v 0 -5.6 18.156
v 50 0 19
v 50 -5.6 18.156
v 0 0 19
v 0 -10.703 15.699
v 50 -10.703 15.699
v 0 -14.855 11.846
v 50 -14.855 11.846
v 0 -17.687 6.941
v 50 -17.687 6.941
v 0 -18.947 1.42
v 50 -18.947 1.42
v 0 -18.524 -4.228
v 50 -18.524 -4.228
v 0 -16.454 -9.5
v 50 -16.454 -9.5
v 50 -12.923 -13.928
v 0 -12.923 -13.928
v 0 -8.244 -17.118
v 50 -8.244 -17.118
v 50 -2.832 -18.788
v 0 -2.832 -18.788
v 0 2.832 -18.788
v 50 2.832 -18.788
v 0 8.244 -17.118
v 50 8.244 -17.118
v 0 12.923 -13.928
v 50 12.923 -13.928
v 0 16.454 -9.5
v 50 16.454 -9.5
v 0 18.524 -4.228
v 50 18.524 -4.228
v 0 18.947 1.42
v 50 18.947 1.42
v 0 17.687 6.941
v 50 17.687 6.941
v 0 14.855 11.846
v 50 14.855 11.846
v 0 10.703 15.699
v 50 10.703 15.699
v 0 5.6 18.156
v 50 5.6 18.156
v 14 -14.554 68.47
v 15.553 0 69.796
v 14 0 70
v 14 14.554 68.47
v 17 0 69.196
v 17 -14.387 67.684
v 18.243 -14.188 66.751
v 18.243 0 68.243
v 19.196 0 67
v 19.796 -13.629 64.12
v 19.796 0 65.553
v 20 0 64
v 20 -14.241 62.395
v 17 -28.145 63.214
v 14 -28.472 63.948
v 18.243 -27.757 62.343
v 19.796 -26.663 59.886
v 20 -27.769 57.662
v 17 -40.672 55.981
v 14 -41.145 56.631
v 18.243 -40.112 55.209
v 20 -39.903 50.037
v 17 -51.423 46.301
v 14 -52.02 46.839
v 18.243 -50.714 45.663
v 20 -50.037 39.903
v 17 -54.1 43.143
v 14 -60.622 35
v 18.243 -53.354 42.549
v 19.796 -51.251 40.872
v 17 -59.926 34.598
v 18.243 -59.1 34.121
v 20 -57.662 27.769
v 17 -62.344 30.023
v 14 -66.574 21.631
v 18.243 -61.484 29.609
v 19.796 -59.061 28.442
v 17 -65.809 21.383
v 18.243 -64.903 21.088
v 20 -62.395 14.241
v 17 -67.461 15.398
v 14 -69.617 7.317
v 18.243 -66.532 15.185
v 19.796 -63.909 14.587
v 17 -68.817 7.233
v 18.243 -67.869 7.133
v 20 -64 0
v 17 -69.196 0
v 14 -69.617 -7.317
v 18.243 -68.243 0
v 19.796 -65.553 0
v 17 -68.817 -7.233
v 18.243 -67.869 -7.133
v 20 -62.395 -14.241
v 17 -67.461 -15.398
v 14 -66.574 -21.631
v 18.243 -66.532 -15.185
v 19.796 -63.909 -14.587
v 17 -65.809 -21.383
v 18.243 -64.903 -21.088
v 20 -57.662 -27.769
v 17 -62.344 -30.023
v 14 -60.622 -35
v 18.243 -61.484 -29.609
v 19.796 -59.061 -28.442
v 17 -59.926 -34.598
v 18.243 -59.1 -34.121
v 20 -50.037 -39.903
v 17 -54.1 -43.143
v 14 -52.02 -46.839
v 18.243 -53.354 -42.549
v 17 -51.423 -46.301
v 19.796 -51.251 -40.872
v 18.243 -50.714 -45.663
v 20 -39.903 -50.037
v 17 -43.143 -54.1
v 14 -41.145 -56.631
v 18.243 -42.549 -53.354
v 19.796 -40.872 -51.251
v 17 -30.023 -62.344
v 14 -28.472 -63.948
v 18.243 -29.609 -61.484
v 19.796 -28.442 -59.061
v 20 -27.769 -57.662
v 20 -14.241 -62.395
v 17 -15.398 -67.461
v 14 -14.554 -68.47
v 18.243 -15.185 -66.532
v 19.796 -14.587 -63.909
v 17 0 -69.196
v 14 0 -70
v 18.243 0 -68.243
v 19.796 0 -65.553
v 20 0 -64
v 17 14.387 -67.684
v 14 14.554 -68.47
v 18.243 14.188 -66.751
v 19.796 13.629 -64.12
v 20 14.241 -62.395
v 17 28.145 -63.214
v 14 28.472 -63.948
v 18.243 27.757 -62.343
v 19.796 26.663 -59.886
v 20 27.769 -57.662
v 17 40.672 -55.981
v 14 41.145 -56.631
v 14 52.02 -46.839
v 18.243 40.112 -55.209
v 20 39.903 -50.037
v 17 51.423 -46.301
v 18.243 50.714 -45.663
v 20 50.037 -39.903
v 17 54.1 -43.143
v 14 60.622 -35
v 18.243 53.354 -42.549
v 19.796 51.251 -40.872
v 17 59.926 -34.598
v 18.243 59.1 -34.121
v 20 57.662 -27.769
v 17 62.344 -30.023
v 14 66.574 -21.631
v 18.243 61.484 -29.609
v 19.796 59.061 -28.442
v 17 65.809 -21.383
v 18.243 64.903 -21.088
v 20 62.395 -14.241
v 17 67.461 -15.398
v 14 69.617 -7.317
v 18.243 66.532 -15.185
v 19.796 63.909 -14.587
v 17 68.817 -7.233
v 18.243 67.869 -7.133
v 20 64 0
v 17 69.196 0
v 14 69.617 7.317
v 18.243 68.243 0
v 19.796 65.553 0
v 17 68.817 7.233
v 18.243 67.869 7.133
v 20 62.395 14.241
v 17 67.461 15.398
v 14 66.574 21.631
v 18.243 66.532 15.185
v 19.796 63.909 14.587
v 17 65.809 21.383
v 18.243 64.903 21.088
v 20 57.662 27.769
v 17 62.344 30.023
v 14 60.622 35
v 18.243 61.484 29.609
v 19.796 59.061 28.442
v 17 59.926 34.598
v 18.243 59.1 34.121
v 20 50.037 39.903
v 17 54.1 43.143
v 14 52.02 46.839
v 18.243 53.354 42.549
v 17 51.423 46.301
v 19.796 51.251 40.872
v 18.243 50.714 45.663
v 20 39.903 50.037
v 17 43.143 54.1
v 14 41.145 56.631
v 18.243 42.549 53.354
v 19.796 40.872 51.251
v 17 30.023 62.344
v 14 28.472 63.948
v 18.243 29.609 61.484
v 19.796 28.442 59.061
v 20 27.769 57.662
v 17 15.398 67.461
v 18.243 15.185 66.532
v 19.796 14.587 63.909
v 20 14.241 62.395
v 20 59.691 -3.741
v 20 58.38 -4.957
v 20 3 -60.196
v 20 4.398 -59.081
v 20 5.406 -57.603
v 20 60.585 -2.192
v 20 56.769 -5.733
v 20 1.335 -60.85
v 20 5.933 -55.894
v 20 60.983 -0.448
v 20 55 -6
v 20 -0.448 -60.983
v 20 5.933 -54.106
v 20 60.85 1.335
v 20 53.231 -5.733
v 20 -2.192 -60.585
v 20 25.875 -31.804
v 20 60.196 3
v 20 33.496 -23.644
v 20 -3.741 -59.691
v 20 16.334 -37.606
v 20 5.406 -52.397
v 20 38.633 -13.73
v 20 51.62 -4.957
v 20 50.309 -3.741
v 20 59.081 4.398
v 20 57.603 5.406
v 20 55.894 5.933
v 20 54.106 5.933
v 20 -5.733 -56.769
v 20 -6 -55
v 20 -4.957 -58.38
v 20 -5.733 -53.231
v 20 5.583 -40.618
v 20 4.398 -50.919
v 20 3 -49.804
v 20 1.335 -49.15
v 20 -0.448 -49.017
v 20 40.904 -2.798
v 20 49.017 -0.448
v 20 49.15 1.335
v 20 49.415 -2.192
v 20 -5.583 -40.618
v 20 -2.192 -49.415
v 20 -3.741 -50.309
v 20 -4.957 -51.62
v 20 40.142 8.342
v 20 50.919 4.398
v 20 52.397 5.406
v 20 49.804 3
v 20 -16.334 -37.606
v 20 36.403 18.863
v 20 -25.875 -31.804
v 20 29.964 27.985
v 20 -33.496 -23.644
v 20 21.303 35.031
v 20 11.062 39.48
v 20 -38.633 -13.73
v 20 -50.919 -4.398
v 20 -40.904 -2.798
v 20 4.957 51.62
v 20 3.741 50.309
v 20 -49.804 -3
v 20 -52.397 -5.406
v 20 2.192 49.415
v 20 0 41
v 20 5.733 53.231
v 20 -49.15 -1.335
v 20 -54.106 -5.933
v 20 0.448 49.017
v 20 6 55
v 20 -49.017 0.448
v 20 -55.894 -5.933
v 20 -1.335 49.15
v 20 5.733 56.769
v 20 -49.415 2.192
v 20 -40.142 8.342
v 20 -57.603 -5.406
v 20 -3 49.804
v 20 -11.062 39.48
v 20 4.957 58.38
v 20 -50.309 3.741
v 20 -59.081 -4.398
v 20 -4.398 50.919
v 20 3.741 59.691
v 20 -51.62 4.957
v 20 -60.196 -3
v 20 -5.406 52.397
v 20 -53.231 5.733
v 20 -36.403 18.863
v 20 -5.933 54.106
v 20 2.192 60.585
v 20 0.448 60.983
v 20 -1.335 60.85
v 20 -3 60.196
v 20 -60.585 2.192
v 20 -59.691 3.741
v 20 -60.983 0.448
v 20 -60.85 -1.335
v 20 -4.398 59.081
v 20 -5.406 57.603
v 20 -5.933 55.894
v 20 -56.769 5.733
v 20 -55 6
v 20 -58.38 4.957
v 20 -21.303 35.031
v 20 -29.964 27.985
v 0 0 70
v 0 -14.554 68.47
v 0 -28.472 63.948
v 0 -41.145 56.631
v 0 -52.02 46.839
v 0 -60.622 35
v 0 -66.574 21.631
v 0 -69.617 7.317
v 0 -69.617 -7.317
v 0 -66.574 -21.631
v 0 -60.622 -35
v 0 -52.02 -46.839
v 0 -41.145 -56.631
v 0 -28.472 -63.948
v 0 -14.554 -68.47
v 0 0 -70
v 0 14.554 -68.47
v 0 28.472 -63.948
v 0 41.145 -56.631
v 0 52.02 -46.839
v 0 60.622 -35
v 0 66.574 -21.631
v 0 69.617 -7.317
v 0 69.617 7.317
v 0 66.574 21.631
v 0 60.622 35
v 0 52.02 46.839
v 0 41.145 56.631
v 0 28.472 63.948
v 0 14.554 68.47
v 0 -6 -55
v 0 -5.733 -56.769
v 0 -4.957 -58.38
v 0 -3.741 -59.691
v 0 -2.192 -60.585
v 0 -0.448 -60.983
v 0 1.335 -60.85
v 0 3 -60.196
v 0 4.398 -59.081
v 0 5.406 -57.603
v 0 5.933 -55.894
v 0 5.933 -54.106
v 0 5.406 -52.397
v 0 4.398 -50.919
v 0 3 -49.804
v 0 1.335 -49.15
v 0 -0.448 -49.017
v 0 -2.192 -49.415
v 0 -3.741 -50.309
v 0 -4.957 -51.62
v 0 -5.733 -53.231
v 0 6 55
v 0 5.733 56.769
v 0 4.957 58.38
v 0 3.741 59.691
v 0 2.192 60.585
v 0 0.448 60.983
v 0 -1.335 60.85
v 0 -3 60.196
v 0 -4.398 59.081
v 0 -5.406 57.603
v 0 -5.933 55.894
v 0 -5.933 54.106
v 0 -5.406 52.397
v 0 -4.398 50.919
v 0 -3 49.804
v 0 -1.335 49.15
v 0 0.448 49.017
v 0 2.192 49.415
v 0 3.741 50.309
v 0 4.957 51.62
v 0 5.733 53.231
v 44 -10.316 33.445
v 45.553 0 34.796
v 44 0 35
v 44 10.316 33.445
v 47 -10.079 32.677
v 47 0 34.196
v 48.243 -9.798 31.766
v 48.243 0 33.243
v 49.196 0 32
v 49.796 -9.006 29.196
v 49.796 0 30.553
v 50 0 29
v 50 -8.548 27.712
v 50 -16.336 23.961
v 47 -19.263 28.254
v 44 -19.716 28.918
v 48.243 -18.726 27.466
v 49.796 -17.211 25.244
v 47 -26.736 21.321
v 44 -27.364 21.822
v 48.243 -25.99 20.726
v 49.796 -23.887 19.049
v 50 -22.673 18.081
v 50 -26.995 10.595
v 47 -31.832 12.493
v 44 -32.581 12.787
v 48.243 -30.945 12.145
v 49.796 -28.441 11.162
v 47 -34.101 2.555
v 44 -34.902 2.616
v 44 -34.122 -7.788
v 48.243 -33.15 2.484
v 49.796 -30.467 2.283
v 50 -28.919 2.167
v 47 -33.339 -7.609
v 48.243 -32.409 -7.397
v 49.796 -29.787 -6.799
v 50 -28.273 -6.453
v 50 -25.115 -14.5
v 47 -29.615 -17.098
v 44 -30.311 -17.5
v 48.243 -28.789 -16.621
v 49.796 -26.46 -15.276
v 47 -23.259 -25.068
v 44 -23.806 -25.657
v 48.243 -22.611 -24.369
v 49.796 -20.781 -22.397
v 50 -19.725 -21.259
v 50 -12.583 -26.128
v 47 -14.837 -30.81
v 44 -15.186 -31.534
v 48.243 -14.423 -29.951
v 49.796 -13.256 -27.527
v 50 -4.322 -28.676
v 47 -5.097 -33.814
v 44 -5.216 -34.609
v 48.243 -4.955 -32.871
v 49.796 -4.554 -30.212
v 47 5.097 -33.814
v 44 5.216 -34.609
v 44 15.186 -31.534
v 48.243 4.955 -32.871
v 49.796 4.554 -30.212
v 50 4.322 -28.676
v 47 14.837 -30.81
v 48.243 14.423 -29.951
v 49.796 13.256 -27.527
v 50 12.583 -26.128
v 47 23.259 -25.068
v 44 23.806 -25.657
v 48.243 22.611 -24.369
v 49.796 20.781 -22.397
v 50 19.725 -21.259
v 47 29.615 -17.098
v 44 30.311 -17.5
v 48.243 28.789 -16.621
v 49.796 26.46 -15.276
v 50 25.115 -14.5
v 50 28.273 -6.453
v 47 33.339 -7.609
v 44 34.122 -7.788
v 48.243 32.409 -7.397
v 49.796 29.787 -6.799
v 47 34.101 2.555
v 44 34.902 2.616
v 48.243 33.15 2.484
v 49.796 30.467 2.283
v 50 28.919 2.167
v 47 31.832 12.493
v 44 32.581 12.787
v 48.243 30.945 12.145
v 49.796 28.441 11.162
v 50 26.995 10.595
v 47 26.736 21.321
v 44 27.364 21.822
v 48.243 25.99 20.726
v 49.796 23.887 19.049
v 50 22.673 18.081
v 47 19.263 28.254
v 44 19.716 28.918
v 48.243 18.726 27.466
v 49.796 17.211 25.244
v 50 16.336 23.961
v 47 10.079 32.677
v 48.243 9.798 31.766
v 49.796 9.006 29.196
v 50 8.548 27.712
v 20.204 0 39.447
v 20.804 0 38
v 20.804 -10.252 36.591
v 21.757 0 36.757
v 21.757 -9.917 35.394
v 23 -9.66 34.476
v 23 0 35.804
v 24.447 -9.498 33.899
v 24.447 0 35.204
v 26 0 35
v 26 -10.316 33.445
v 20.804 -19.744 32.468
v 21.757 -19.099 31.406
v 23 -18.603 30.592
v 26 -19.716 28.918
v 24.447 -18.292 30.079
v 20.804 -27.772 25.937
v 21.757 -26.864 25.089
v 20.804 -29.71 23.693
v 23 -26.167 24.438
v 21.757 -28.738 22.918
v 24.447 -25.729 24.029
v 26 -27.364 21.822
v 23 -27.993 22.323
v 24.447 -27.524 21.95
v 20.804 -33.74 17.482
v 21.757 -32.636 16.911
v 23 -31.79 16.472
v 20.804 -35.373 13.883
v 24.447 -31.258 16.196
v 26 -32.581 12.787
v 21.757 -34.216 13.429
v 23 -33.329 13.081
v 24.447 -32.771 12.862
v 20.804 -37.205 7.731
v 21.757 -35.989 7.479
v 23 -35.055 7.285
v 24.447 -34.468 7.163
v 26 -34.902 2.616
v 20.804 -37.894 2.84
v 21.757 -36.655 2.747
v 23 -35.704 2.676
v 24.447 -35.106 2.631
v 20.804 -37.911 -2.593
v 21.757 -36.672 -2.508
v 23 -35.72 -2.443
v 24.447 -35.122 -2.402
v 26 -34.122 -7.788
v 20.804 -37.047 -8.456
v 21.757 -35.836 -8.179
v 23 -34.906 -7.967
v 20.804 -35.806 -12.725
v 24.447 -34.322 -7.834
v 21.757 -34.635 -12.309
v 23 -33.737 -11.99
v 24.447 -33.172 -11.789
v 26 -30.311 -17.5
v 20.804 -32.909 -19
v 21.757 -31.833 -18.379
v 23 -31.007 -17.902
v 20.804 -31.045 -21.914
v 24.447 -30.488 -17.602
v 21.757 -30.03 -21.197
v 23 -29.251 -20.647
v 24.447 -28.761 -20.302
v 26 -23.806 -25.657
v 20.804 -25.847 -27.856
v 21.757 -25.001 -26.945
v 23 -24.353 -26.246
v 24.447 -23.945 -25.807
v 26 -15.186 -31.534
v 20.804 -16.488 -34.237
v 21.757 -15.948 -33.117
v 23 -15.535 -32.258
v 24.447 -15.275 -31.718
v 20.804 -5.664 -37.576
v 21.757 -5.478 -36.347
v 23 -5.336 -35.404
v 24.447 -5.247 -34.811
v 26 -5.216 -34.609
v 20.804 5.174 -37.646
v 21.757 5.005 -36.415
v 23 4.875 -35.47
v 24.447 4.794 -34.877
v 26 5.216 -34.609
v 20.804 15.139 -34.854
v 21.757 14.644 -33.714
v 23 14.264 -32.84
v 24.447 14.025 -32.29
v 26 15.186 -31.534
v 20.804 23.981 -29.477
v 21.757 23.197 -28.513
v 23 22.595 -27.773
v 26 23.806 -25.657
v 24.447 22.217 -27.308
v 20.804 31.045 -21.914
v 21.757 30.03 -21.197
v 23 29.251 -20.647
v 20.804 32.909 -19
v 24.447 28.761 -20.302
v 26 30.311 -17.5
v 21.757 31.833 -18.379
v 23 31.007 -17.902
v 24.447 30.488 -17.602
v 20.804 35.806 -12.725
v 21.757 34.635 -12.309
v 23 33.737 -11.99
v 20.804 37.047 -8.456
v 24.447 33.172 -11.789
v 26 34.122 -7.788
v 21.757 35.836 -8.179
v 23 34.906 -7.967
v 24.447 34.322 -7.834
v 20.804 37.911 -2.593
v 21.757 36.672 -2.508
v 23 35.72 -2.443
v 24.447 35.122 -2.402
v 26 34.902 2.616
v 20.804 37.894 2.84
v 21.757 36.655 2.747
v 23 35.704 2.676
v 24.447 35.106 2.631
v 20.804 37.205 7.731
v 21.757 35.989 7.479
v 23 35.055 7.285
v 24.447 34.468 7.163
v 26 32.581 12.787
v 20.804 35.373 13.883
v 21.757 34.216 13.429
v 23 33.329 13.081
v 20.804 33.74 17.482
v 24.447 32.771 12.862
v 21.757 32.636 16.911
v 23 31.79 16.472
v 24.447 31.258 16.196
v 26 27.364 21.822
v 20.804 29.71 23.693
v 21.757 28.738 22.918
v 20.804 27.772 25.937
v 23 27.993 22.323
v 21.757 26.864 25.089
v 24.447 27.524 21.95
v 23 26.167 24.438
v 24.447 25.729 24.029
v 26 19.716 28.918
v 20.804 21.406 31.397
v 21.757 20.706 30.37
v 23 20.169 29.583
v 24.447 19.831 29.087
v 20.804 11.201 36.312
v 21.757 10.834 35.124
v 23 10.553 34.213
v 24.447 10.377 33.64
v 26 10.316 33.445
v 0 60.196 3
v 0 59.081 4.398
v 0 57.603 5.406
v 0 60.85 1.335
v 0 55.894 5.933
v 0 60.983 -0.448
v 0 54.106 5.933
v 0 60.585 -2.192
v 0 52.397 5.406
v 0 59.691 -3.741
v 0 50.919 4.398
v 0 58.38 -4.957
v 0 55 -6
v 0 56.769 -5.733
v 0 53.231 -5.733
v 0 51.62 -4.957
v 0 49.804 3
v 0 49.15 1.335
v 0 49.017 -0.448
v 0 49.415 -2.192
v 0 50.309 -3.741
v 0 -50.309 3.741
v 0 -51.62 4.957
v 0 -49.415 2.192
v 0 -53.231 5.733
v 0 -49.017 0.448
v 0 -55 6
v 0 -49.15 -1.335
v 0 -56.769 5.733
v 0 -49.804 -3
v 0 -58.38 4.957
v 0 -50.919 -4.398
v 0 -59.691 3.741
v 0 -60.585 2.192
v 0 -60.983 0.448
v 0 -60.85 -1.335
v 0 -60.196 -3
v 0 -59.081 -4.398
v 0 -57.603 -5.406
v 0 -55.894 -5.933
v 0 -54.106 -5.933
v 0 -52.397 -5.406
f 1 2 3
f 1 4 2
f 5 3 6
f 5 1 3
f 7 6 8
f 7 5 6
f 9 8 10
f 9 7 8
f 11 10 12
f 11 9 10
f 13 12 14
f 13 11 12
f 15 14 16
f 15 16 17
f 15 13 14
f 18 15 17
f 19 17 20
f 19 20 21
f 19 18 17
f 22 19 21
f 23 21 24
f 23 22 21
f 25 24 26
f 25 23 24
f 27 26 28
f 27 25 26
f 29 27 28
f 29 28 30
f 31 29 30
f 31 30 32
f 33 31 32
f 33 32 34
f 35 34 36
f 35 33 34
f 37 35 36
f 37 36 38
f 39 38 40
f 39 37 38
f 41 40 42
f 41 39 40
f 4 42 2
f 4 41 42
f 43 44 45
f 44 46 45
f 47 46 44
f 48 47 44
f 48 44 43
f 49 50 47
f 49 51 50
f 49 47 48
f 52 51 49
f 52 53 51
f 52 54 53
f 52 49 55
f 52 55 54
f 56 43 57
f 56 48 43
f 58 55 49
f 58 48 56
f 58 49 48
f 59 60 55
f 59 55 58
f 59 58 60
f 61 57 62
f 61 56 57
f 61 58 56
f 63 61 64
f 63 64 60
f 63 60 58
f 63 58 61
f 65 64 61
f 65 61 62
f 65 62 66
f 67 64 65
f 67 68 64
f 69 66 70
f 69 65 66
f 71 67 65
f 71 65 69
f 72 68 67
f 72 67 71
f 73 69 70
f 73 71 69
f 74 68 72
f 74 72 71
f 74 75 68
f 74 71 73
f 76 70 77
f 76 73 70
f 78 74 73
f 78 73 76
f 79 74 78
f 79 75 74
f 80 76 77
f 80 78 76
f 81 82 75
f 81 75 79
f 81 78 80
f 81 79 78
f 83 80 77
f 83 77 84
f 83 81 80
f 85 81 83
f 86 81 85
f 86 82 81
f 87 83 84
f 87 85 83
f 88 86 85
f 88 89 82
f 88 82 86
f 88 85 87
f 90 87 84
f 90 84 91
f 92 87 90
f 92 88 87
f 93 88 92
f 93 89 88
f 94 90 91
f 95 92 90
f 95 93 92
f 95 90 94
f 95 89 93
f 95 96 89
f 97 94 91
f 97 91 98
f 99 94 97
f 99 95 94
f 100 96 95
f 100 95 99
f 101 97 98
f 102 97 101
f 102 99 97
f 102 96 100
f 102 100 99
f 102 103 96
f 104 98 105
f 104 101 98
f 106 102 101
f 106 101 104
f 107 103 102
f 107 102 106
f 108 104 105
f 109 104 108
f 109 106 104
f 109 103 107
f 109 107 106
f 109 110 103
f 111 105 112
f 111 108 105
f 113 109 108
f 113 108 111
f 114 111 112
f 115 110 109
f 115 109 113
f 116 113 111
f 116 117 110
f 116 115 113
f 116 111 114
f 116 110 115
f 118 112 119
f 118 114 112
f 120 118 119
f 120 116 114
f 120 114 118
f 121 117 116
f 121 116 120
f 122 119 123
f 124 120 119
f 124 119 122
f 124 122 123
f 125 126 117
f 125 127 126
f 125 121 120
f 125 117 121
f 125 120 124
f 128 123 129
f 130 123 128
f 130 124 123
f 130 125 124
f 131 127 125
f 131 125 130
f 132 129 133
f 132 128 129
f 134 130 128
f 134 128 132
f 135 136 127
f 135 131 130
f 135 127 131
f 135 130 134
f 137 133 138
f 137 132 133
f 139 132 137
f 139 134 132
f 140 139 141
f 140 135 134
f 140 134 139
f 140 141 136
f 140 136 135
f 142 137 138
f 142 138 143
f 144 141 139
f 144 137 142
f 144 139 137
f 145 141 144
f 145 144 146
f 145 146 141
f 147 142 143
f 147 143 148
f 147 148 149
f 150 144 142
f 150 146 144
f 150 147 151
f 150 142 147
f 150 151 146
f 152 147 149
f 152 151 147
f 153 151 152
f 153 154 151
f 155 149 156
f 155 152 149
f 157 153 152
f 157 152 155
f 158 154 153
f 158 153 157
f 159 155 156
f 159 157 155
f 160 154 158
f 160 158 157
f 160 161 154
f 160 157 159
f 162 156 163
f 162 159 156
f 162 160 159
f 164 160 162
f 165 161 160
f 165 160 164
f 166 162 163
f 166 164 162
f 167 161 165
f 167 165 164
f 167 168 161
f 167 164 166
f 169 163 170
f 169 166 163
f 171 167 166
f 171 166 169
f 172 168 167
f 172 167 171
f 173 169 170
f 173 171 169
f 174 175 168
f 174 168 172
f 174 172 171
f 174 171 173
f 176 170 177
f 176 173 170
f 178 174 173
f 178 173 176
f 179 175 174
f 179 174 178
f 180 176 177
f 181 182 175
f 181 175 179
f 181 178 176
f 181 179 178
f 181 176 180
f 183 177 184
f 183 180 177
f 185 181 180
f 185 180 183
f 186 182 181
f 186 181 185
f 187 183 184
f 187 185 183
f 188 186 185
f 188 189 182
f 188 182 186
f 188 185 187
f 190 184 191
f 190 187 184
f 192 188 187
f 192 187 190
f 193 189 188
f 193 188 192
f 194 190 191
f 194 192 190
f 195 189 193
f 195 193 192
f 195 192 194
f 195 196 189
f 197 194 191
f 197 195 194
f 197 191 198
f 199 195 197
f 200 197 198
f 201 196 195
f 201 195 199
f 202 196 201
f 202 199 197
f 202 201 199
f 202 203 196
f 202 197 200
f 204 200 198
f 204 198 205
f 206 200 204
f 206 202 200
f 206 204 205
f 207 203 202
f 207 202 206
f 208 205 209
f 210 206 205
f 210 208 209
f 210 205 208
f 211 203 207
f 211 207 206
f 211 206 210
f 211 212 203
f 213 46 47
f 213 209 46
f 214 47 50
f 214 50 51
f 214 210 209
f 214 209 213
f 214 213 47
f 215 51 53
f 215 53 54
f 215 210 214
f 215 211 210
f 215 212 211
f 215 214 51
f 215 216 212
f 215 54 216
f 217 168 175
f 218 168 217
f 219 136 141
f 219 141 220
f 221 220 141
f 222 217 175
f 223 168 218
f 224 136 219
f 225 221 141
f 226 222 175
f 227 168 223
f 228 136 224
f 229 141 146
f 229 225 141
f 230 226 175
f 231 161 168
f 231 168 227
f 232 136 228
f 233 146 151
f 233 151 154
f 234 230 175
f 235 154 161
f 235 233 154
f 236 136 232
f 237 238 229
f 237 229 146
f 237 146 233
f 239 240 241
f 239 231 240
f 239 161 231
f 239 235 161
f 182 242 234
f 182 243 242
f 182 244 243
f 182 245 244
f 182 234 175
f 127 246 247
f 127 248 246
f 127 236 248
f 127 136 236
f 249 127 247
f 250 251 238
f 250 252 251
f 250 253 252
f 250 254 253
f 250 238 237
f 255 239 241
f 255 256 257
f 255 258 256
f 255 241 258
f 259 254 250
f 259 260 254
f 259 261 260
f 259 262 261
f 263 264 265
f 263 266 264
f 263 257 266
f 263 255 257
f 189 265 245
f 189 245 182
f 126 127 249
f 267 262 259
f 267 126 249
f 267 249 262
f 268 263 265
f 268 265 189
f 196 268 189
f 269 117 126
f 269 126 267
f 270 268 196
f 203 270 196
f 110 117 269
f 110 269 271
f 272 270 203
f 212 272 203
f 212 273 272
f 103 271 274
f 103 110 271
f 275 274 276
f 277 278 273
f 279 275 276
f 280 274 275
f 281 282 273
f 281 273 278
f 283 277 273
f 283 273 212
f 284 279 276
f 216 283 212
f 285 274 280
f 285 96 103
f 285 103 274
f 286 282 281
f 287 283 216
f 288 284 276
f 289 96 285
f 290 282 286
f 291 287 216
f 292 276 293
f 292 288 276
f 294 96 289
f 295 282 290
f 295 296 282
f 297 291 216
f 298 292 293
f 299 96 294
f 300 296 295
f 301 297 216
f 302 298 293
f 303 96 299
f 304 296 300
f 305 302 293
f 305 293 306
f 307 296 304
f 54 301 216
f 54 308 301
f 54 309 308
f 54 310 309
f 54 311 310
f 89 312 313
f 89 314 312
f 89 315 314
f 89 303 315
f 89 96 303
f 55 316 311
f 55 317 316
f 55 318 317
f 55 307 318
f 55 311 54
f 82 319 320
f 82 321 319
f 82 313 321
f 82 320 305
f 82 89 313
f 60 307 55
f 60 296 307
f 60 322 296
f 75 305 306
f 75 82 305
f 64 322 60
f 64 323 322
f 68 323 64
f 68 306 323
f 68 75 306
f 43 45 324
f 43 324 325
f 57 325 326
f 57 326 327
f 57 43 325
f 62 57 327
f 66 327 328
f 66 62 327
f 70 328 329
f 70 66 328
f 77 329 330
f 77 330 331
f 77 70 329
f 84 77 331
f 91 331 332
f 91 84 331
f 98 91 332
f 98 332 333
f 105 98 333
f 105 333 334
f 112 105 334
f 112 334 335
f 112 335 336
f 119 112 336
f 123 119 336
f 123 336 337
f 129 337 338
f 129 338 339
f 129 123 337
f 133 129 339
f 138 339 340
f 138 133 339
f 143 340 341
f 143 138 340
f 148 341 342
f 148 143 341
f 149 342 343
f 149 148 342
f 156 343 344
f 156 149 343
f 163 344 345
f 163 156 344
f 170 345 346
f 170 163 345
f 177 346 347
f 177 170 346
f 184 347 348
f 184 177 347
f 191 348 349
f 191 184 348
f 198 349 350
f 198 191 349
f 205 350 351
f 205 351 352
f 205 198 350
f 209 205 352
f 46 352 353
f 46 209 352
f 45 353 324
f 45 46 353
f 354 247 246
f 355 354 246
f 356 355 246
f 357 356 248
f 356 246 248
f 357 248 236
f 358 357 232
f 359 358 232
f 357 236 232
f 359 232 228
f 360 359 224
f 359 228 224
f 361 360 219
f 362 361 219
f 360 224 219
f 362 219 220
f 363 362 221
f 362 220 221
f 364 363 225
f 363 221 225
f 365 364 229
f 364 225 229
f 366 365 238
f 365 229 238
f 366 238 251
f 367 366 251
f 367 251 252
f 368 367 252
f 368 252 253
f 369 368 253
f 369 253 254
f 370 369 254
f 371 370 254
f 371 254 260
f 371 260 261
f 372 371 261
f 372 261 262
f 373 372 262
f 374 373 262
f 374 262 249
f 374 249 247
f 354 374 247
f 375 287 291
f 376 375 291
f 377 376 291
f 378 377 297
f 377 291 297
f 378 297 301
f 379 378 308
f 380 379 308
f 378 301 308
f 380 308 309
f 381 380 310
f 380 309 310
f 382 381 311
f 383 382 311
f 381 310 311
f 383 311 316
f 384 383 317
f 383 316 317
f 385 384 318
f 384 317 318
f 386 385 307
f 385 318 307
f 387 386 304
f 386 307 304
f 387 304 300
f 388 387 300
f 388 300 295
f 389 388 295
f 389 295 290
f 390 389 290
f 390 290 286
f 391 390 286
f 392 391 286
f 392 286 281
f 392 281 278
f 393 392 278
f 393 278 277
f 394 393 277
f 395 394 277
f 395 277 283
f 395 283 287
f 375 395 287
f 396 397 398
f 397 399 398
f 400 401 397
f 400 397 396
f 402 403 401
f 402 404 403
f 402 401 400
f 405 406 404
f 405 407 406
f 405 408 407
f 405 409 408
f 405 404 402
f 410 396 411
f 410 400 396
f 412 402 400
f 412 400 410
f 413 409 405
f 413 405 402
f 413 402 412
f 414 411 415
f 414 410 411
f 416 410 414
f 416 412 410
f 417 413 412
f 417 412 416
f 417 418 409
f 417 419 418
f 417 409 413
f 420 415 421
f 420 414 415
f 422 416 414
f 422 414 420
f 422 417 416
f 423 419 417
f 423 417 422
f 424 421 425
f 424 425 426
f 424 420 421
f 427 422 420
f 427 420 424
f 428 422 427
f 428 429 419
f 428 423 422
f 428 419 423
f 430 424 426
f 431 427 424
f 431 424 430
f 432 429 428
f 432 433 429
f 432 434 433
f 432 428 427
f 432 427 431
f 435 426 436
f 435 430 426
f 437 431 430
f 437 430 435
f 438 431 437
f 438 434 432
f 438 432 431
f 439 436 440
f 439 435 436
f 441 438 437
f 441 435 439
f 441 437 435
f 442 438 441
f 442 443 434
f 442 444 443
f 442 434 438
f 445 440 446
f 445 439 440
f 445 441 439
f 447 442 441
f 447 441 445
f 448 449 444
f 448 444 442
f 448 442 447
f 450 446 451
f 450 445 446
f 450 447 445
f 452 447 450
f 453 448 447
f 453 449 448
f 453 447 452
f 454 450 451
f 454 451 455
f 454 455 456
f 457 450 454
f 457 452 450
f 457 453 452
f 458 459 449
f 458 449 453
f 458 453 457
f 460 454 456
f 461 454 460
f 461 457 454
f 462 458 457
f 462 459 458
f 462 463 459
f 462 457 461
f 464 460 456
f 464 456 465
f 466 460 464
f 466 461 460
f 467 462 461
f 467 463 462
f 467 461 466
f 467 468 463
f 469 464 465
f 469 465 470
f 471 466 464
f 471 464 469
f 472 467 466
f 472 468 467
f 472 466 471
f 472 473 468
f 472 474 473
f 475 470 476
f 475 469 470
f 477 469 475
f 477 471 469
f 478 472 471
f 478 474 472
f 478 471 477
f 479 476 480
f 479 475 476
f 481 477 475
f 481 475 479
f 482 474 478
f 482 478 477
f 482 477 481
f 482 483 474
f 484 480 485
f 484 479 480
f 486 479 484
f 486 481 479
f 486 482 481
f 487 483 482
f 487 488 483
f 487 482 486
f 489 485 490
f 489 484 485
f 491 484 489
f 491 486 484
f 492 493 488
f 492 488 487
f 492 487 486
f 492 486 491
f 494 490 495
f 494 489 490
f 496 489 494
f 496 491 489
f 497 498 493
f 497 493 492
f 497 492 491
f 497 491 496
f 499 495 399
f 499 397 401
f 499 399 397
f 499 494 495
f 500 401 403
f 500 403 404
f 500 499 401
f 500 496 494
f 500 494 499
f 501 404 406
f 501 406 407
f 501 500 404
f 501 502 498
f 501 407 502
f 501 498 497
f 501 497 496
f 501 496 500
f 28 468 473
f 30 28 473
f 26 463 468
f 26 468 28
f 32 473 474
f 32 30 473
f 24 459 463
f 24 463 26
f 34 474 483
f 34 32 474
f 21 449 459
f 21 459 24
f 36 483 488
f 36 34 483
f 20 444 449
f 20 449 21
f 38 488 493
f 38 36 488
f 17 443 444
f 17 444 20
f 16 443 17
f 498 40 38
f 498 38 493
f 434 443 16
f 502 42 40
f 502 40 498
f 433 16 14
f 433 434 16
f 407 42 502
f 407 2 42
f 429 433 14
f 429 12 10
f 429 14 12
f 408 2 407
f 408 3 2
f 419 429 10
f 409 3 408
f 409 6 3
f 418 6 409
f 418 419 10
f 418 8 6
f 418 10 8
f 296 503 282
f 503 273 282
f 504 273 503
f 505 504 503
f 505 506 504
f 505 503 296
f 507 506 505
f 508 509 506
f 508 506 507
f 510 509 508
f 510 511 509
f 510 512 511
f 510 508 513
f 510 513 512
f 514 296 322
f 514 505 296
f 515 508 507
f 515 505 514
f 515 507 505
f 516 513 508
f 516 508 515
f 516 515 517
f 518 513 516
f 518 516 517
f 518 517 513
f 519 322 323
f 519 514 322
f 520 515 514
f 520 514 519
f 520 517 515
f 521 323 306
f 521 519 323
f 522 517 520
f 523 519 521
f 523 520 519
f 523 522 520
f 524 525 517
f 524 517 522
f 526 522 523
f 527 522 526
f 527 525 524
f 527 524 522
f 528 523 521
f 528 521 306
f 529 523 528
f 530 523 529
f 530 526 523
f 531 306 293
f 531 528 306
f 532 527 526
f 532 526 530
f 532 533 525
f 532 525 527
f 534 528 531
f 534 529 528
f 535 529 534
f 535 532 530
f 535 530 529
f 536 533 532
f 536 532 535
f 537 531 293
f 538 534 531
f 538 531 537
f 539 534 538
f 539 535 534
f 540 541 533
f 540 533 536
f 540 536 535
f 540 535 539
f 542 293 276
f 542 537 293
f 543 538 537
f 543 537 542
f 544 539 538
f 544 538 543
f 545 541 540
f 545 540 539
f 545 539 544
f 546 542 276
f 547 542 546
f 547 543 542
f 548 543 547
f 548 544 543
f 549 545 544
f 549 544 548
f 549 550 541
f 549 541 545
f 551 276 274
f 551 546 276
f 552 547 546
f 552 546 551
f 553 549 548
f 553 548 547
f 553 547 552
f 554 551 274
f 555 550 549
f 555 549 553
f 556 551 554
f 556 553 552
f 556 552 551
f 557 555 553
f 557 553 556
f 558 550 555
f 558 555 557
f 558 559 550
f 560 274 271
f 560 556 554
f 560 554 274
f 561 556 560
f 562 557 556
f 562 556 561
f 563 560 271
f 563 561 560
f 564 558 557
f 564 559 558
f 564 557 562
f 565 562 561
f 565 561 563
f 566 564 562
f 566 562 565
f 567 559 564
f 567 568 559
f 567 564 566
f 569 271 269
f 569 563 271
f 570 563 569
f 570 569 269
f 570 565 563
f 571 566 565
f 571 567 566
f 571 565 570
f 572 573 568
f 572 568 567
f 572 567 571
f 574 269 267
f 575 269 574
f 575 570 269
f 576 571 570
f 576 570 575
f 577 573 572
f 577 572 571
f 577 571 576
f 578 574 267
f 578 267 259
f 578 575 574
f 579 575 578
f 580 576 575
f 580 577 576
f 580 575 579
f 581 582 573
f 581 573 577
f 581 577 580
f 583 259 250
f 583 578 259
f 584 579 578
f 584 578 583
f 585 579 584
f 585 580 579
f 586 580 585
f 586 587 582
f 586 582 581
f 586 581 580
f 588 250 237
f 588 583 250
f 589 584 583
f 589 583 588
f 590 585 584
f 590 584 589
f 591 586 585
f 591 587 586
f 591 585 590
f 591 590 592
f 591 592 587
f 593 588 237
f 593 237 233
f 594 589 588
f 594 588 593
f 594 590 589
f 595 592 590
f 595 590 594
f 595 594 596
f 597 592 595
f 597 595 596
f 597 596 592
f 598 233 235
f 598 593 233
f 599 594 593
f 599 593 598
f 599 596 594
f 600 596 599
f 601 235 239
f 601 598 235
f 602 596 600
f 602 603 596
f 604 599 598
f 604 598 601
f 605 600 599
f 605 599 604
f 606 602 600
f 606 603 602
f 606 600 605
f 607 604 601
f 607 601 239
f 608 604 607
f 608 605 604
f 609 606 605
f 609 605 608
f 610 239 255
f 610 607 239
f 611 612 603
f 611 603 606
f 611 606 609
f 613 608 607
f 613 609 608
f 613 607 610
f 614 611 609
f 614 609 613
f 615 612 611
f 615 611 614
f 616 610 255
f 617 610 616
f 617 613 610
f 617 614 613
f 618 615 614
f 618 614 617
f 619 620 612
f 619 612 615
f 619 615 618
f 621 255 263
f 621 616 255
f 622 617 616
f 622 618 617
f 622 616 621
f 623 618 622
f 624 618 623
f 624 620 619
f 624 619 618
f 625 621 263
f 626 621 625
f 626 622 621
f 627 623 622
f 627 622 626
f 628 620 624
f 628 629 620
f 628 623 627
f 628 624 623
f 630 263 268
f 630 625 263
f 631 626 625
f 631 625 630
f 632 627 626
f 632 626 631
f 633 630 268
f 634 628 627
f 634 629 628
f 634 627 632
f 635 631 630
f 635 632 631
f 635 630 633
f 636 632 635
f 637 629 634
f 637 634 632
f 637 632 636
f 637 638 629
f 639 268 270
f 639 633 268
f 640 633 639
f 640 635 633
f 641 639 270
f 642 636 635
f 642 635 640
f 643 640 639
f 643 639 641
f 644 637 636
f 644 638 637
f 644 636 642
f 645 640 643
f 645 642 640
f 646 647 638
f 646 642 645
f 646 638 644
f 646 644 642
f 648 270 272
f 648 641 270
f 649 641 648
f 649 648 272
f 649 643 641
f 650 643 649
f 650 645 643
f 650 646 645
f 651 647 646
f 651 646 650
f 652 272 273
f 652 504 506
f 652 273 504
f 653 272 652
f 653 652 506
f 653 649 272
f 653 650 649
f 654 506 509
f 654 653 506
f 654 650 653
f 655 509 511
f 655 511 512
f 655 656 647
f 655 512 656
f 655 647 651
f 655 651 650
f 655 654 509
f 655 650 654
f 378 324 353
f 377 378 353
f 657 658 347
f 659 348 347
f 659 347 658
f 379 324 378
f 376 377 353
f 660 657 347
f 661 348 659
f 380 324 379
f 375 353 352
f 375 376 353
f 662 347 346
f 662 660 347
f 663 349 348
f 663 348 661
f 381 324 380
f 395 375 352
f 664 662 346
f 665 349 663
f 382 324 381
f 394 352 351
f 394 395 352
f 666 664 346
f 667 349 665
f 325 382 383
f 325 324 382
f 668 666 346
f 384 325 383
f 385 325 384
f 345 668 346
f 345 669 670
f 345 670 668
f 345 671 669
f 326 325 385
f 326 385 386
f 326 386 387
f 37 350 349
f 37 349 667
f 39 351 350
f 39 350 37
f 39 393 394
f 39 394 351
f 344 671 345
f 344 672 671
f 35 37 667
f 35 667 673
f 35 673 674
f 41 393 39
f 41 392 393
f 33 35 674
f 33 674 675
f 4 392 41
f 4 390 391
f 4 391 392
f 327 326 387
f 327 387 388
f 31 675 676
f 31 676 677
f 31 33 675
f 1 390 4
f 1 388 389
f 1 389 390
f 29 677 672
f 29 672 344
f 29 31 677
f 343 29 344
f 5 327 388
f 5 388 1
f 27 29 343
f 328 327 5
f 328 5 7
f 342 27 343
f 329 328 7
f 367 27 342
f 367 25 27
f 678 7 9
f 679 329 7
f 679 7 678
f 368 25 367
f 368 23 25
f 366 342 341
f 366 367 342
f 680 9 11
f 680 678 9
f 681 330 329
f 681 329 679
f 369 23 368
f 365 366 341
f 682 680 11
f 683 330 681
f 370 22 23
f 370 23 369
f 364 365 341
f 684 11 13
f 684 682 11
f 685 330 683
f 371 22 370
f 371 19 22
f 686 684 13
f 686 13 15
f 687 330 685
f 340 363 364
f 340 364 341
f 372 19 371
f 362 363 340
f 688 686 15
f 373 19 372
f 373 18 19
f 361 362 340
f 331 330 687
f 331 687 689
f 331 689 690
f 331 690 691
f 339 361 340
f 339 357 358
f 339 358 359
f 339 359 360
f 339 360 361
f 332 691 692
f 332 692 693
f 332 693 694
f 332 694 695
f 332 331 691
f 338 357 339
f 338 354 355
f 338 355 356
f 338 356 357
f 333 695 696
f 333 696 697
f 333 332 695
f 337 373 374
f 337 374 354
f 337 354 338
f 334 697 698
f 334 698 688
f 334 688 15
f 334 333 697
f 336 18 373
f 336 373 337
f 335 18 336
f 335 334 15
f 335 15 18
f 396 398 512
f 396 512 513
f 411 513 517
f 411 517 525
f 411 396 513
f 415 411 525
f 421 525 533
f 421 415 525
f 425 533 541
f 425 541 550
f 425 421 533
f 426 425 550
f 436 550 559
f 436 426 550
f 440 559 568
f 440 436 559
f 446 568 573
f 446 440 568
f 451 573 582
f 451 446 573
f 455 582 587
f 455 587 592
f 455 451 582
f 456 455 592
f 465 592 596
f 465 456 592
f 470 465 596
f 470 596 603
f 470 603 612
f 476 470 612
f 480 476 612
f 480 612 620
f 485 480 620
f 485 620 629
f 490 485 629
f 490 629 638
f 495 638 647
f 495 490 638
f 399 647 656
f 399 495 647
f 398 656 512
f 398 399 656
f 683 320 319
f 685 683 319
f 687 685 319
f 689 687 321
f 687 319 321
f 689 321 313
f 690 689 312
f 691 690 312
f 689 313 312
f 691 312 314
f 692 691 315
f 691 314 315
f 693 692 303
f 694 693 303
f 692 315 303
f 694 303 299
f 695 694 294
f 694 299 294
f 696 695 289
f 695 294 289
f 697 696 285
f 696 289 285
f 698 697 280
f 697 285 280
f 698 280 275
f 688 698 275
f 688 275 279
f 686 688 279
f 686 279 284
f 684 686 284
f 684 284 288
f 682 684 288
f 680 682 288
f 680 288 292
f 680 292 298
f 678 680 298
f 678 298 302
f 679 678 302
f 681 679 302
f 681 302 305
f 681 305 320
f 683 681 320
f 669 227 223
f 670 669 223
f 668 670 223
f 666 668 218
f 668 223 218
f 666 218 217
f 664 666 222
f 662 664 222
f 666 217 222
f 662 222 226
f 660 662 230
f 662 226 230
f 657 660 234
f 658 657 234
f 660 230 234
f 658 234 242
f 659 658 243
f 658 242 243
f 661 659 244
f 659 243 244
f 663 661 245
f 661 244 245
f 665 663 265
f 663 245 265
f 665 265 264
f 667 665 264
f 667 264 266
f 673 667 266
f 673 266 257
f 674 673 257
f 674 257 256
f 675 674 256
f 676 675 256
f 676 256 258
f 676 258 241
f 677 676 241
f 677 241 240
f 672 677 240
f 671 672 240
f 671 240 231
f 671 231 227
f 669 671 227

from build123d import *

# Parameters (mm, degrees)
FILLET1_R                  = 6
F_12_0_12_DIAMETER_HOLE1_D = 12
CIRPATTERN1_COUNT          = 4


with BuildPart() as part:
    # Sketch1 → Revolve1 (revolve)
    with BuildSketch(Plane.XY, mode=Mode.PRIVATE) as revolve1_sk:
        Polygon((0, 19), (0, 70), (20, 70), (20, 35), (50, 35), (50, 19), align=None)
    revolve(revolve1_sk.sketch.rotate(Axis((0, 0, 0), (1, 0, 0)), 90), axis=Axis((0, 0, 0), (1, 0, 0)))

    # Fillet1
    fillet1_edges = [part.edges().sort_by_distance(p)[0] for p in [
        (50, 0, -35),
        (20, 0, -35),
        (20, 0, -70),
    ]]
    fillet(fillet1_edges, radius=FILLET1_R)

    # Ø12.0 (12) Diameter Hole1 (through all)
    with Locations(Plane.ZY):
        with Locations((0, 55)):
            f_12_0_12_diameter_hole1 = Hole(F_12_0_12_DIAMETER_HOLE1_D / 2)

    # CirPattern1: Ø12.0 (12) Diameter Hole1 ×4 about axis
    cirpattern1_axis = Axis((0, 0, 0), (1, 0, 0))
    for i in range(1, CIRPATTERN1_COUNT):
        add(f_12_0_12_diameter_hole1.rotate(cirpattern1_axis, i * 360 / CIRPATTERN1_COUNT), mode=Mode.SUBTRACT)


solid = part.part
